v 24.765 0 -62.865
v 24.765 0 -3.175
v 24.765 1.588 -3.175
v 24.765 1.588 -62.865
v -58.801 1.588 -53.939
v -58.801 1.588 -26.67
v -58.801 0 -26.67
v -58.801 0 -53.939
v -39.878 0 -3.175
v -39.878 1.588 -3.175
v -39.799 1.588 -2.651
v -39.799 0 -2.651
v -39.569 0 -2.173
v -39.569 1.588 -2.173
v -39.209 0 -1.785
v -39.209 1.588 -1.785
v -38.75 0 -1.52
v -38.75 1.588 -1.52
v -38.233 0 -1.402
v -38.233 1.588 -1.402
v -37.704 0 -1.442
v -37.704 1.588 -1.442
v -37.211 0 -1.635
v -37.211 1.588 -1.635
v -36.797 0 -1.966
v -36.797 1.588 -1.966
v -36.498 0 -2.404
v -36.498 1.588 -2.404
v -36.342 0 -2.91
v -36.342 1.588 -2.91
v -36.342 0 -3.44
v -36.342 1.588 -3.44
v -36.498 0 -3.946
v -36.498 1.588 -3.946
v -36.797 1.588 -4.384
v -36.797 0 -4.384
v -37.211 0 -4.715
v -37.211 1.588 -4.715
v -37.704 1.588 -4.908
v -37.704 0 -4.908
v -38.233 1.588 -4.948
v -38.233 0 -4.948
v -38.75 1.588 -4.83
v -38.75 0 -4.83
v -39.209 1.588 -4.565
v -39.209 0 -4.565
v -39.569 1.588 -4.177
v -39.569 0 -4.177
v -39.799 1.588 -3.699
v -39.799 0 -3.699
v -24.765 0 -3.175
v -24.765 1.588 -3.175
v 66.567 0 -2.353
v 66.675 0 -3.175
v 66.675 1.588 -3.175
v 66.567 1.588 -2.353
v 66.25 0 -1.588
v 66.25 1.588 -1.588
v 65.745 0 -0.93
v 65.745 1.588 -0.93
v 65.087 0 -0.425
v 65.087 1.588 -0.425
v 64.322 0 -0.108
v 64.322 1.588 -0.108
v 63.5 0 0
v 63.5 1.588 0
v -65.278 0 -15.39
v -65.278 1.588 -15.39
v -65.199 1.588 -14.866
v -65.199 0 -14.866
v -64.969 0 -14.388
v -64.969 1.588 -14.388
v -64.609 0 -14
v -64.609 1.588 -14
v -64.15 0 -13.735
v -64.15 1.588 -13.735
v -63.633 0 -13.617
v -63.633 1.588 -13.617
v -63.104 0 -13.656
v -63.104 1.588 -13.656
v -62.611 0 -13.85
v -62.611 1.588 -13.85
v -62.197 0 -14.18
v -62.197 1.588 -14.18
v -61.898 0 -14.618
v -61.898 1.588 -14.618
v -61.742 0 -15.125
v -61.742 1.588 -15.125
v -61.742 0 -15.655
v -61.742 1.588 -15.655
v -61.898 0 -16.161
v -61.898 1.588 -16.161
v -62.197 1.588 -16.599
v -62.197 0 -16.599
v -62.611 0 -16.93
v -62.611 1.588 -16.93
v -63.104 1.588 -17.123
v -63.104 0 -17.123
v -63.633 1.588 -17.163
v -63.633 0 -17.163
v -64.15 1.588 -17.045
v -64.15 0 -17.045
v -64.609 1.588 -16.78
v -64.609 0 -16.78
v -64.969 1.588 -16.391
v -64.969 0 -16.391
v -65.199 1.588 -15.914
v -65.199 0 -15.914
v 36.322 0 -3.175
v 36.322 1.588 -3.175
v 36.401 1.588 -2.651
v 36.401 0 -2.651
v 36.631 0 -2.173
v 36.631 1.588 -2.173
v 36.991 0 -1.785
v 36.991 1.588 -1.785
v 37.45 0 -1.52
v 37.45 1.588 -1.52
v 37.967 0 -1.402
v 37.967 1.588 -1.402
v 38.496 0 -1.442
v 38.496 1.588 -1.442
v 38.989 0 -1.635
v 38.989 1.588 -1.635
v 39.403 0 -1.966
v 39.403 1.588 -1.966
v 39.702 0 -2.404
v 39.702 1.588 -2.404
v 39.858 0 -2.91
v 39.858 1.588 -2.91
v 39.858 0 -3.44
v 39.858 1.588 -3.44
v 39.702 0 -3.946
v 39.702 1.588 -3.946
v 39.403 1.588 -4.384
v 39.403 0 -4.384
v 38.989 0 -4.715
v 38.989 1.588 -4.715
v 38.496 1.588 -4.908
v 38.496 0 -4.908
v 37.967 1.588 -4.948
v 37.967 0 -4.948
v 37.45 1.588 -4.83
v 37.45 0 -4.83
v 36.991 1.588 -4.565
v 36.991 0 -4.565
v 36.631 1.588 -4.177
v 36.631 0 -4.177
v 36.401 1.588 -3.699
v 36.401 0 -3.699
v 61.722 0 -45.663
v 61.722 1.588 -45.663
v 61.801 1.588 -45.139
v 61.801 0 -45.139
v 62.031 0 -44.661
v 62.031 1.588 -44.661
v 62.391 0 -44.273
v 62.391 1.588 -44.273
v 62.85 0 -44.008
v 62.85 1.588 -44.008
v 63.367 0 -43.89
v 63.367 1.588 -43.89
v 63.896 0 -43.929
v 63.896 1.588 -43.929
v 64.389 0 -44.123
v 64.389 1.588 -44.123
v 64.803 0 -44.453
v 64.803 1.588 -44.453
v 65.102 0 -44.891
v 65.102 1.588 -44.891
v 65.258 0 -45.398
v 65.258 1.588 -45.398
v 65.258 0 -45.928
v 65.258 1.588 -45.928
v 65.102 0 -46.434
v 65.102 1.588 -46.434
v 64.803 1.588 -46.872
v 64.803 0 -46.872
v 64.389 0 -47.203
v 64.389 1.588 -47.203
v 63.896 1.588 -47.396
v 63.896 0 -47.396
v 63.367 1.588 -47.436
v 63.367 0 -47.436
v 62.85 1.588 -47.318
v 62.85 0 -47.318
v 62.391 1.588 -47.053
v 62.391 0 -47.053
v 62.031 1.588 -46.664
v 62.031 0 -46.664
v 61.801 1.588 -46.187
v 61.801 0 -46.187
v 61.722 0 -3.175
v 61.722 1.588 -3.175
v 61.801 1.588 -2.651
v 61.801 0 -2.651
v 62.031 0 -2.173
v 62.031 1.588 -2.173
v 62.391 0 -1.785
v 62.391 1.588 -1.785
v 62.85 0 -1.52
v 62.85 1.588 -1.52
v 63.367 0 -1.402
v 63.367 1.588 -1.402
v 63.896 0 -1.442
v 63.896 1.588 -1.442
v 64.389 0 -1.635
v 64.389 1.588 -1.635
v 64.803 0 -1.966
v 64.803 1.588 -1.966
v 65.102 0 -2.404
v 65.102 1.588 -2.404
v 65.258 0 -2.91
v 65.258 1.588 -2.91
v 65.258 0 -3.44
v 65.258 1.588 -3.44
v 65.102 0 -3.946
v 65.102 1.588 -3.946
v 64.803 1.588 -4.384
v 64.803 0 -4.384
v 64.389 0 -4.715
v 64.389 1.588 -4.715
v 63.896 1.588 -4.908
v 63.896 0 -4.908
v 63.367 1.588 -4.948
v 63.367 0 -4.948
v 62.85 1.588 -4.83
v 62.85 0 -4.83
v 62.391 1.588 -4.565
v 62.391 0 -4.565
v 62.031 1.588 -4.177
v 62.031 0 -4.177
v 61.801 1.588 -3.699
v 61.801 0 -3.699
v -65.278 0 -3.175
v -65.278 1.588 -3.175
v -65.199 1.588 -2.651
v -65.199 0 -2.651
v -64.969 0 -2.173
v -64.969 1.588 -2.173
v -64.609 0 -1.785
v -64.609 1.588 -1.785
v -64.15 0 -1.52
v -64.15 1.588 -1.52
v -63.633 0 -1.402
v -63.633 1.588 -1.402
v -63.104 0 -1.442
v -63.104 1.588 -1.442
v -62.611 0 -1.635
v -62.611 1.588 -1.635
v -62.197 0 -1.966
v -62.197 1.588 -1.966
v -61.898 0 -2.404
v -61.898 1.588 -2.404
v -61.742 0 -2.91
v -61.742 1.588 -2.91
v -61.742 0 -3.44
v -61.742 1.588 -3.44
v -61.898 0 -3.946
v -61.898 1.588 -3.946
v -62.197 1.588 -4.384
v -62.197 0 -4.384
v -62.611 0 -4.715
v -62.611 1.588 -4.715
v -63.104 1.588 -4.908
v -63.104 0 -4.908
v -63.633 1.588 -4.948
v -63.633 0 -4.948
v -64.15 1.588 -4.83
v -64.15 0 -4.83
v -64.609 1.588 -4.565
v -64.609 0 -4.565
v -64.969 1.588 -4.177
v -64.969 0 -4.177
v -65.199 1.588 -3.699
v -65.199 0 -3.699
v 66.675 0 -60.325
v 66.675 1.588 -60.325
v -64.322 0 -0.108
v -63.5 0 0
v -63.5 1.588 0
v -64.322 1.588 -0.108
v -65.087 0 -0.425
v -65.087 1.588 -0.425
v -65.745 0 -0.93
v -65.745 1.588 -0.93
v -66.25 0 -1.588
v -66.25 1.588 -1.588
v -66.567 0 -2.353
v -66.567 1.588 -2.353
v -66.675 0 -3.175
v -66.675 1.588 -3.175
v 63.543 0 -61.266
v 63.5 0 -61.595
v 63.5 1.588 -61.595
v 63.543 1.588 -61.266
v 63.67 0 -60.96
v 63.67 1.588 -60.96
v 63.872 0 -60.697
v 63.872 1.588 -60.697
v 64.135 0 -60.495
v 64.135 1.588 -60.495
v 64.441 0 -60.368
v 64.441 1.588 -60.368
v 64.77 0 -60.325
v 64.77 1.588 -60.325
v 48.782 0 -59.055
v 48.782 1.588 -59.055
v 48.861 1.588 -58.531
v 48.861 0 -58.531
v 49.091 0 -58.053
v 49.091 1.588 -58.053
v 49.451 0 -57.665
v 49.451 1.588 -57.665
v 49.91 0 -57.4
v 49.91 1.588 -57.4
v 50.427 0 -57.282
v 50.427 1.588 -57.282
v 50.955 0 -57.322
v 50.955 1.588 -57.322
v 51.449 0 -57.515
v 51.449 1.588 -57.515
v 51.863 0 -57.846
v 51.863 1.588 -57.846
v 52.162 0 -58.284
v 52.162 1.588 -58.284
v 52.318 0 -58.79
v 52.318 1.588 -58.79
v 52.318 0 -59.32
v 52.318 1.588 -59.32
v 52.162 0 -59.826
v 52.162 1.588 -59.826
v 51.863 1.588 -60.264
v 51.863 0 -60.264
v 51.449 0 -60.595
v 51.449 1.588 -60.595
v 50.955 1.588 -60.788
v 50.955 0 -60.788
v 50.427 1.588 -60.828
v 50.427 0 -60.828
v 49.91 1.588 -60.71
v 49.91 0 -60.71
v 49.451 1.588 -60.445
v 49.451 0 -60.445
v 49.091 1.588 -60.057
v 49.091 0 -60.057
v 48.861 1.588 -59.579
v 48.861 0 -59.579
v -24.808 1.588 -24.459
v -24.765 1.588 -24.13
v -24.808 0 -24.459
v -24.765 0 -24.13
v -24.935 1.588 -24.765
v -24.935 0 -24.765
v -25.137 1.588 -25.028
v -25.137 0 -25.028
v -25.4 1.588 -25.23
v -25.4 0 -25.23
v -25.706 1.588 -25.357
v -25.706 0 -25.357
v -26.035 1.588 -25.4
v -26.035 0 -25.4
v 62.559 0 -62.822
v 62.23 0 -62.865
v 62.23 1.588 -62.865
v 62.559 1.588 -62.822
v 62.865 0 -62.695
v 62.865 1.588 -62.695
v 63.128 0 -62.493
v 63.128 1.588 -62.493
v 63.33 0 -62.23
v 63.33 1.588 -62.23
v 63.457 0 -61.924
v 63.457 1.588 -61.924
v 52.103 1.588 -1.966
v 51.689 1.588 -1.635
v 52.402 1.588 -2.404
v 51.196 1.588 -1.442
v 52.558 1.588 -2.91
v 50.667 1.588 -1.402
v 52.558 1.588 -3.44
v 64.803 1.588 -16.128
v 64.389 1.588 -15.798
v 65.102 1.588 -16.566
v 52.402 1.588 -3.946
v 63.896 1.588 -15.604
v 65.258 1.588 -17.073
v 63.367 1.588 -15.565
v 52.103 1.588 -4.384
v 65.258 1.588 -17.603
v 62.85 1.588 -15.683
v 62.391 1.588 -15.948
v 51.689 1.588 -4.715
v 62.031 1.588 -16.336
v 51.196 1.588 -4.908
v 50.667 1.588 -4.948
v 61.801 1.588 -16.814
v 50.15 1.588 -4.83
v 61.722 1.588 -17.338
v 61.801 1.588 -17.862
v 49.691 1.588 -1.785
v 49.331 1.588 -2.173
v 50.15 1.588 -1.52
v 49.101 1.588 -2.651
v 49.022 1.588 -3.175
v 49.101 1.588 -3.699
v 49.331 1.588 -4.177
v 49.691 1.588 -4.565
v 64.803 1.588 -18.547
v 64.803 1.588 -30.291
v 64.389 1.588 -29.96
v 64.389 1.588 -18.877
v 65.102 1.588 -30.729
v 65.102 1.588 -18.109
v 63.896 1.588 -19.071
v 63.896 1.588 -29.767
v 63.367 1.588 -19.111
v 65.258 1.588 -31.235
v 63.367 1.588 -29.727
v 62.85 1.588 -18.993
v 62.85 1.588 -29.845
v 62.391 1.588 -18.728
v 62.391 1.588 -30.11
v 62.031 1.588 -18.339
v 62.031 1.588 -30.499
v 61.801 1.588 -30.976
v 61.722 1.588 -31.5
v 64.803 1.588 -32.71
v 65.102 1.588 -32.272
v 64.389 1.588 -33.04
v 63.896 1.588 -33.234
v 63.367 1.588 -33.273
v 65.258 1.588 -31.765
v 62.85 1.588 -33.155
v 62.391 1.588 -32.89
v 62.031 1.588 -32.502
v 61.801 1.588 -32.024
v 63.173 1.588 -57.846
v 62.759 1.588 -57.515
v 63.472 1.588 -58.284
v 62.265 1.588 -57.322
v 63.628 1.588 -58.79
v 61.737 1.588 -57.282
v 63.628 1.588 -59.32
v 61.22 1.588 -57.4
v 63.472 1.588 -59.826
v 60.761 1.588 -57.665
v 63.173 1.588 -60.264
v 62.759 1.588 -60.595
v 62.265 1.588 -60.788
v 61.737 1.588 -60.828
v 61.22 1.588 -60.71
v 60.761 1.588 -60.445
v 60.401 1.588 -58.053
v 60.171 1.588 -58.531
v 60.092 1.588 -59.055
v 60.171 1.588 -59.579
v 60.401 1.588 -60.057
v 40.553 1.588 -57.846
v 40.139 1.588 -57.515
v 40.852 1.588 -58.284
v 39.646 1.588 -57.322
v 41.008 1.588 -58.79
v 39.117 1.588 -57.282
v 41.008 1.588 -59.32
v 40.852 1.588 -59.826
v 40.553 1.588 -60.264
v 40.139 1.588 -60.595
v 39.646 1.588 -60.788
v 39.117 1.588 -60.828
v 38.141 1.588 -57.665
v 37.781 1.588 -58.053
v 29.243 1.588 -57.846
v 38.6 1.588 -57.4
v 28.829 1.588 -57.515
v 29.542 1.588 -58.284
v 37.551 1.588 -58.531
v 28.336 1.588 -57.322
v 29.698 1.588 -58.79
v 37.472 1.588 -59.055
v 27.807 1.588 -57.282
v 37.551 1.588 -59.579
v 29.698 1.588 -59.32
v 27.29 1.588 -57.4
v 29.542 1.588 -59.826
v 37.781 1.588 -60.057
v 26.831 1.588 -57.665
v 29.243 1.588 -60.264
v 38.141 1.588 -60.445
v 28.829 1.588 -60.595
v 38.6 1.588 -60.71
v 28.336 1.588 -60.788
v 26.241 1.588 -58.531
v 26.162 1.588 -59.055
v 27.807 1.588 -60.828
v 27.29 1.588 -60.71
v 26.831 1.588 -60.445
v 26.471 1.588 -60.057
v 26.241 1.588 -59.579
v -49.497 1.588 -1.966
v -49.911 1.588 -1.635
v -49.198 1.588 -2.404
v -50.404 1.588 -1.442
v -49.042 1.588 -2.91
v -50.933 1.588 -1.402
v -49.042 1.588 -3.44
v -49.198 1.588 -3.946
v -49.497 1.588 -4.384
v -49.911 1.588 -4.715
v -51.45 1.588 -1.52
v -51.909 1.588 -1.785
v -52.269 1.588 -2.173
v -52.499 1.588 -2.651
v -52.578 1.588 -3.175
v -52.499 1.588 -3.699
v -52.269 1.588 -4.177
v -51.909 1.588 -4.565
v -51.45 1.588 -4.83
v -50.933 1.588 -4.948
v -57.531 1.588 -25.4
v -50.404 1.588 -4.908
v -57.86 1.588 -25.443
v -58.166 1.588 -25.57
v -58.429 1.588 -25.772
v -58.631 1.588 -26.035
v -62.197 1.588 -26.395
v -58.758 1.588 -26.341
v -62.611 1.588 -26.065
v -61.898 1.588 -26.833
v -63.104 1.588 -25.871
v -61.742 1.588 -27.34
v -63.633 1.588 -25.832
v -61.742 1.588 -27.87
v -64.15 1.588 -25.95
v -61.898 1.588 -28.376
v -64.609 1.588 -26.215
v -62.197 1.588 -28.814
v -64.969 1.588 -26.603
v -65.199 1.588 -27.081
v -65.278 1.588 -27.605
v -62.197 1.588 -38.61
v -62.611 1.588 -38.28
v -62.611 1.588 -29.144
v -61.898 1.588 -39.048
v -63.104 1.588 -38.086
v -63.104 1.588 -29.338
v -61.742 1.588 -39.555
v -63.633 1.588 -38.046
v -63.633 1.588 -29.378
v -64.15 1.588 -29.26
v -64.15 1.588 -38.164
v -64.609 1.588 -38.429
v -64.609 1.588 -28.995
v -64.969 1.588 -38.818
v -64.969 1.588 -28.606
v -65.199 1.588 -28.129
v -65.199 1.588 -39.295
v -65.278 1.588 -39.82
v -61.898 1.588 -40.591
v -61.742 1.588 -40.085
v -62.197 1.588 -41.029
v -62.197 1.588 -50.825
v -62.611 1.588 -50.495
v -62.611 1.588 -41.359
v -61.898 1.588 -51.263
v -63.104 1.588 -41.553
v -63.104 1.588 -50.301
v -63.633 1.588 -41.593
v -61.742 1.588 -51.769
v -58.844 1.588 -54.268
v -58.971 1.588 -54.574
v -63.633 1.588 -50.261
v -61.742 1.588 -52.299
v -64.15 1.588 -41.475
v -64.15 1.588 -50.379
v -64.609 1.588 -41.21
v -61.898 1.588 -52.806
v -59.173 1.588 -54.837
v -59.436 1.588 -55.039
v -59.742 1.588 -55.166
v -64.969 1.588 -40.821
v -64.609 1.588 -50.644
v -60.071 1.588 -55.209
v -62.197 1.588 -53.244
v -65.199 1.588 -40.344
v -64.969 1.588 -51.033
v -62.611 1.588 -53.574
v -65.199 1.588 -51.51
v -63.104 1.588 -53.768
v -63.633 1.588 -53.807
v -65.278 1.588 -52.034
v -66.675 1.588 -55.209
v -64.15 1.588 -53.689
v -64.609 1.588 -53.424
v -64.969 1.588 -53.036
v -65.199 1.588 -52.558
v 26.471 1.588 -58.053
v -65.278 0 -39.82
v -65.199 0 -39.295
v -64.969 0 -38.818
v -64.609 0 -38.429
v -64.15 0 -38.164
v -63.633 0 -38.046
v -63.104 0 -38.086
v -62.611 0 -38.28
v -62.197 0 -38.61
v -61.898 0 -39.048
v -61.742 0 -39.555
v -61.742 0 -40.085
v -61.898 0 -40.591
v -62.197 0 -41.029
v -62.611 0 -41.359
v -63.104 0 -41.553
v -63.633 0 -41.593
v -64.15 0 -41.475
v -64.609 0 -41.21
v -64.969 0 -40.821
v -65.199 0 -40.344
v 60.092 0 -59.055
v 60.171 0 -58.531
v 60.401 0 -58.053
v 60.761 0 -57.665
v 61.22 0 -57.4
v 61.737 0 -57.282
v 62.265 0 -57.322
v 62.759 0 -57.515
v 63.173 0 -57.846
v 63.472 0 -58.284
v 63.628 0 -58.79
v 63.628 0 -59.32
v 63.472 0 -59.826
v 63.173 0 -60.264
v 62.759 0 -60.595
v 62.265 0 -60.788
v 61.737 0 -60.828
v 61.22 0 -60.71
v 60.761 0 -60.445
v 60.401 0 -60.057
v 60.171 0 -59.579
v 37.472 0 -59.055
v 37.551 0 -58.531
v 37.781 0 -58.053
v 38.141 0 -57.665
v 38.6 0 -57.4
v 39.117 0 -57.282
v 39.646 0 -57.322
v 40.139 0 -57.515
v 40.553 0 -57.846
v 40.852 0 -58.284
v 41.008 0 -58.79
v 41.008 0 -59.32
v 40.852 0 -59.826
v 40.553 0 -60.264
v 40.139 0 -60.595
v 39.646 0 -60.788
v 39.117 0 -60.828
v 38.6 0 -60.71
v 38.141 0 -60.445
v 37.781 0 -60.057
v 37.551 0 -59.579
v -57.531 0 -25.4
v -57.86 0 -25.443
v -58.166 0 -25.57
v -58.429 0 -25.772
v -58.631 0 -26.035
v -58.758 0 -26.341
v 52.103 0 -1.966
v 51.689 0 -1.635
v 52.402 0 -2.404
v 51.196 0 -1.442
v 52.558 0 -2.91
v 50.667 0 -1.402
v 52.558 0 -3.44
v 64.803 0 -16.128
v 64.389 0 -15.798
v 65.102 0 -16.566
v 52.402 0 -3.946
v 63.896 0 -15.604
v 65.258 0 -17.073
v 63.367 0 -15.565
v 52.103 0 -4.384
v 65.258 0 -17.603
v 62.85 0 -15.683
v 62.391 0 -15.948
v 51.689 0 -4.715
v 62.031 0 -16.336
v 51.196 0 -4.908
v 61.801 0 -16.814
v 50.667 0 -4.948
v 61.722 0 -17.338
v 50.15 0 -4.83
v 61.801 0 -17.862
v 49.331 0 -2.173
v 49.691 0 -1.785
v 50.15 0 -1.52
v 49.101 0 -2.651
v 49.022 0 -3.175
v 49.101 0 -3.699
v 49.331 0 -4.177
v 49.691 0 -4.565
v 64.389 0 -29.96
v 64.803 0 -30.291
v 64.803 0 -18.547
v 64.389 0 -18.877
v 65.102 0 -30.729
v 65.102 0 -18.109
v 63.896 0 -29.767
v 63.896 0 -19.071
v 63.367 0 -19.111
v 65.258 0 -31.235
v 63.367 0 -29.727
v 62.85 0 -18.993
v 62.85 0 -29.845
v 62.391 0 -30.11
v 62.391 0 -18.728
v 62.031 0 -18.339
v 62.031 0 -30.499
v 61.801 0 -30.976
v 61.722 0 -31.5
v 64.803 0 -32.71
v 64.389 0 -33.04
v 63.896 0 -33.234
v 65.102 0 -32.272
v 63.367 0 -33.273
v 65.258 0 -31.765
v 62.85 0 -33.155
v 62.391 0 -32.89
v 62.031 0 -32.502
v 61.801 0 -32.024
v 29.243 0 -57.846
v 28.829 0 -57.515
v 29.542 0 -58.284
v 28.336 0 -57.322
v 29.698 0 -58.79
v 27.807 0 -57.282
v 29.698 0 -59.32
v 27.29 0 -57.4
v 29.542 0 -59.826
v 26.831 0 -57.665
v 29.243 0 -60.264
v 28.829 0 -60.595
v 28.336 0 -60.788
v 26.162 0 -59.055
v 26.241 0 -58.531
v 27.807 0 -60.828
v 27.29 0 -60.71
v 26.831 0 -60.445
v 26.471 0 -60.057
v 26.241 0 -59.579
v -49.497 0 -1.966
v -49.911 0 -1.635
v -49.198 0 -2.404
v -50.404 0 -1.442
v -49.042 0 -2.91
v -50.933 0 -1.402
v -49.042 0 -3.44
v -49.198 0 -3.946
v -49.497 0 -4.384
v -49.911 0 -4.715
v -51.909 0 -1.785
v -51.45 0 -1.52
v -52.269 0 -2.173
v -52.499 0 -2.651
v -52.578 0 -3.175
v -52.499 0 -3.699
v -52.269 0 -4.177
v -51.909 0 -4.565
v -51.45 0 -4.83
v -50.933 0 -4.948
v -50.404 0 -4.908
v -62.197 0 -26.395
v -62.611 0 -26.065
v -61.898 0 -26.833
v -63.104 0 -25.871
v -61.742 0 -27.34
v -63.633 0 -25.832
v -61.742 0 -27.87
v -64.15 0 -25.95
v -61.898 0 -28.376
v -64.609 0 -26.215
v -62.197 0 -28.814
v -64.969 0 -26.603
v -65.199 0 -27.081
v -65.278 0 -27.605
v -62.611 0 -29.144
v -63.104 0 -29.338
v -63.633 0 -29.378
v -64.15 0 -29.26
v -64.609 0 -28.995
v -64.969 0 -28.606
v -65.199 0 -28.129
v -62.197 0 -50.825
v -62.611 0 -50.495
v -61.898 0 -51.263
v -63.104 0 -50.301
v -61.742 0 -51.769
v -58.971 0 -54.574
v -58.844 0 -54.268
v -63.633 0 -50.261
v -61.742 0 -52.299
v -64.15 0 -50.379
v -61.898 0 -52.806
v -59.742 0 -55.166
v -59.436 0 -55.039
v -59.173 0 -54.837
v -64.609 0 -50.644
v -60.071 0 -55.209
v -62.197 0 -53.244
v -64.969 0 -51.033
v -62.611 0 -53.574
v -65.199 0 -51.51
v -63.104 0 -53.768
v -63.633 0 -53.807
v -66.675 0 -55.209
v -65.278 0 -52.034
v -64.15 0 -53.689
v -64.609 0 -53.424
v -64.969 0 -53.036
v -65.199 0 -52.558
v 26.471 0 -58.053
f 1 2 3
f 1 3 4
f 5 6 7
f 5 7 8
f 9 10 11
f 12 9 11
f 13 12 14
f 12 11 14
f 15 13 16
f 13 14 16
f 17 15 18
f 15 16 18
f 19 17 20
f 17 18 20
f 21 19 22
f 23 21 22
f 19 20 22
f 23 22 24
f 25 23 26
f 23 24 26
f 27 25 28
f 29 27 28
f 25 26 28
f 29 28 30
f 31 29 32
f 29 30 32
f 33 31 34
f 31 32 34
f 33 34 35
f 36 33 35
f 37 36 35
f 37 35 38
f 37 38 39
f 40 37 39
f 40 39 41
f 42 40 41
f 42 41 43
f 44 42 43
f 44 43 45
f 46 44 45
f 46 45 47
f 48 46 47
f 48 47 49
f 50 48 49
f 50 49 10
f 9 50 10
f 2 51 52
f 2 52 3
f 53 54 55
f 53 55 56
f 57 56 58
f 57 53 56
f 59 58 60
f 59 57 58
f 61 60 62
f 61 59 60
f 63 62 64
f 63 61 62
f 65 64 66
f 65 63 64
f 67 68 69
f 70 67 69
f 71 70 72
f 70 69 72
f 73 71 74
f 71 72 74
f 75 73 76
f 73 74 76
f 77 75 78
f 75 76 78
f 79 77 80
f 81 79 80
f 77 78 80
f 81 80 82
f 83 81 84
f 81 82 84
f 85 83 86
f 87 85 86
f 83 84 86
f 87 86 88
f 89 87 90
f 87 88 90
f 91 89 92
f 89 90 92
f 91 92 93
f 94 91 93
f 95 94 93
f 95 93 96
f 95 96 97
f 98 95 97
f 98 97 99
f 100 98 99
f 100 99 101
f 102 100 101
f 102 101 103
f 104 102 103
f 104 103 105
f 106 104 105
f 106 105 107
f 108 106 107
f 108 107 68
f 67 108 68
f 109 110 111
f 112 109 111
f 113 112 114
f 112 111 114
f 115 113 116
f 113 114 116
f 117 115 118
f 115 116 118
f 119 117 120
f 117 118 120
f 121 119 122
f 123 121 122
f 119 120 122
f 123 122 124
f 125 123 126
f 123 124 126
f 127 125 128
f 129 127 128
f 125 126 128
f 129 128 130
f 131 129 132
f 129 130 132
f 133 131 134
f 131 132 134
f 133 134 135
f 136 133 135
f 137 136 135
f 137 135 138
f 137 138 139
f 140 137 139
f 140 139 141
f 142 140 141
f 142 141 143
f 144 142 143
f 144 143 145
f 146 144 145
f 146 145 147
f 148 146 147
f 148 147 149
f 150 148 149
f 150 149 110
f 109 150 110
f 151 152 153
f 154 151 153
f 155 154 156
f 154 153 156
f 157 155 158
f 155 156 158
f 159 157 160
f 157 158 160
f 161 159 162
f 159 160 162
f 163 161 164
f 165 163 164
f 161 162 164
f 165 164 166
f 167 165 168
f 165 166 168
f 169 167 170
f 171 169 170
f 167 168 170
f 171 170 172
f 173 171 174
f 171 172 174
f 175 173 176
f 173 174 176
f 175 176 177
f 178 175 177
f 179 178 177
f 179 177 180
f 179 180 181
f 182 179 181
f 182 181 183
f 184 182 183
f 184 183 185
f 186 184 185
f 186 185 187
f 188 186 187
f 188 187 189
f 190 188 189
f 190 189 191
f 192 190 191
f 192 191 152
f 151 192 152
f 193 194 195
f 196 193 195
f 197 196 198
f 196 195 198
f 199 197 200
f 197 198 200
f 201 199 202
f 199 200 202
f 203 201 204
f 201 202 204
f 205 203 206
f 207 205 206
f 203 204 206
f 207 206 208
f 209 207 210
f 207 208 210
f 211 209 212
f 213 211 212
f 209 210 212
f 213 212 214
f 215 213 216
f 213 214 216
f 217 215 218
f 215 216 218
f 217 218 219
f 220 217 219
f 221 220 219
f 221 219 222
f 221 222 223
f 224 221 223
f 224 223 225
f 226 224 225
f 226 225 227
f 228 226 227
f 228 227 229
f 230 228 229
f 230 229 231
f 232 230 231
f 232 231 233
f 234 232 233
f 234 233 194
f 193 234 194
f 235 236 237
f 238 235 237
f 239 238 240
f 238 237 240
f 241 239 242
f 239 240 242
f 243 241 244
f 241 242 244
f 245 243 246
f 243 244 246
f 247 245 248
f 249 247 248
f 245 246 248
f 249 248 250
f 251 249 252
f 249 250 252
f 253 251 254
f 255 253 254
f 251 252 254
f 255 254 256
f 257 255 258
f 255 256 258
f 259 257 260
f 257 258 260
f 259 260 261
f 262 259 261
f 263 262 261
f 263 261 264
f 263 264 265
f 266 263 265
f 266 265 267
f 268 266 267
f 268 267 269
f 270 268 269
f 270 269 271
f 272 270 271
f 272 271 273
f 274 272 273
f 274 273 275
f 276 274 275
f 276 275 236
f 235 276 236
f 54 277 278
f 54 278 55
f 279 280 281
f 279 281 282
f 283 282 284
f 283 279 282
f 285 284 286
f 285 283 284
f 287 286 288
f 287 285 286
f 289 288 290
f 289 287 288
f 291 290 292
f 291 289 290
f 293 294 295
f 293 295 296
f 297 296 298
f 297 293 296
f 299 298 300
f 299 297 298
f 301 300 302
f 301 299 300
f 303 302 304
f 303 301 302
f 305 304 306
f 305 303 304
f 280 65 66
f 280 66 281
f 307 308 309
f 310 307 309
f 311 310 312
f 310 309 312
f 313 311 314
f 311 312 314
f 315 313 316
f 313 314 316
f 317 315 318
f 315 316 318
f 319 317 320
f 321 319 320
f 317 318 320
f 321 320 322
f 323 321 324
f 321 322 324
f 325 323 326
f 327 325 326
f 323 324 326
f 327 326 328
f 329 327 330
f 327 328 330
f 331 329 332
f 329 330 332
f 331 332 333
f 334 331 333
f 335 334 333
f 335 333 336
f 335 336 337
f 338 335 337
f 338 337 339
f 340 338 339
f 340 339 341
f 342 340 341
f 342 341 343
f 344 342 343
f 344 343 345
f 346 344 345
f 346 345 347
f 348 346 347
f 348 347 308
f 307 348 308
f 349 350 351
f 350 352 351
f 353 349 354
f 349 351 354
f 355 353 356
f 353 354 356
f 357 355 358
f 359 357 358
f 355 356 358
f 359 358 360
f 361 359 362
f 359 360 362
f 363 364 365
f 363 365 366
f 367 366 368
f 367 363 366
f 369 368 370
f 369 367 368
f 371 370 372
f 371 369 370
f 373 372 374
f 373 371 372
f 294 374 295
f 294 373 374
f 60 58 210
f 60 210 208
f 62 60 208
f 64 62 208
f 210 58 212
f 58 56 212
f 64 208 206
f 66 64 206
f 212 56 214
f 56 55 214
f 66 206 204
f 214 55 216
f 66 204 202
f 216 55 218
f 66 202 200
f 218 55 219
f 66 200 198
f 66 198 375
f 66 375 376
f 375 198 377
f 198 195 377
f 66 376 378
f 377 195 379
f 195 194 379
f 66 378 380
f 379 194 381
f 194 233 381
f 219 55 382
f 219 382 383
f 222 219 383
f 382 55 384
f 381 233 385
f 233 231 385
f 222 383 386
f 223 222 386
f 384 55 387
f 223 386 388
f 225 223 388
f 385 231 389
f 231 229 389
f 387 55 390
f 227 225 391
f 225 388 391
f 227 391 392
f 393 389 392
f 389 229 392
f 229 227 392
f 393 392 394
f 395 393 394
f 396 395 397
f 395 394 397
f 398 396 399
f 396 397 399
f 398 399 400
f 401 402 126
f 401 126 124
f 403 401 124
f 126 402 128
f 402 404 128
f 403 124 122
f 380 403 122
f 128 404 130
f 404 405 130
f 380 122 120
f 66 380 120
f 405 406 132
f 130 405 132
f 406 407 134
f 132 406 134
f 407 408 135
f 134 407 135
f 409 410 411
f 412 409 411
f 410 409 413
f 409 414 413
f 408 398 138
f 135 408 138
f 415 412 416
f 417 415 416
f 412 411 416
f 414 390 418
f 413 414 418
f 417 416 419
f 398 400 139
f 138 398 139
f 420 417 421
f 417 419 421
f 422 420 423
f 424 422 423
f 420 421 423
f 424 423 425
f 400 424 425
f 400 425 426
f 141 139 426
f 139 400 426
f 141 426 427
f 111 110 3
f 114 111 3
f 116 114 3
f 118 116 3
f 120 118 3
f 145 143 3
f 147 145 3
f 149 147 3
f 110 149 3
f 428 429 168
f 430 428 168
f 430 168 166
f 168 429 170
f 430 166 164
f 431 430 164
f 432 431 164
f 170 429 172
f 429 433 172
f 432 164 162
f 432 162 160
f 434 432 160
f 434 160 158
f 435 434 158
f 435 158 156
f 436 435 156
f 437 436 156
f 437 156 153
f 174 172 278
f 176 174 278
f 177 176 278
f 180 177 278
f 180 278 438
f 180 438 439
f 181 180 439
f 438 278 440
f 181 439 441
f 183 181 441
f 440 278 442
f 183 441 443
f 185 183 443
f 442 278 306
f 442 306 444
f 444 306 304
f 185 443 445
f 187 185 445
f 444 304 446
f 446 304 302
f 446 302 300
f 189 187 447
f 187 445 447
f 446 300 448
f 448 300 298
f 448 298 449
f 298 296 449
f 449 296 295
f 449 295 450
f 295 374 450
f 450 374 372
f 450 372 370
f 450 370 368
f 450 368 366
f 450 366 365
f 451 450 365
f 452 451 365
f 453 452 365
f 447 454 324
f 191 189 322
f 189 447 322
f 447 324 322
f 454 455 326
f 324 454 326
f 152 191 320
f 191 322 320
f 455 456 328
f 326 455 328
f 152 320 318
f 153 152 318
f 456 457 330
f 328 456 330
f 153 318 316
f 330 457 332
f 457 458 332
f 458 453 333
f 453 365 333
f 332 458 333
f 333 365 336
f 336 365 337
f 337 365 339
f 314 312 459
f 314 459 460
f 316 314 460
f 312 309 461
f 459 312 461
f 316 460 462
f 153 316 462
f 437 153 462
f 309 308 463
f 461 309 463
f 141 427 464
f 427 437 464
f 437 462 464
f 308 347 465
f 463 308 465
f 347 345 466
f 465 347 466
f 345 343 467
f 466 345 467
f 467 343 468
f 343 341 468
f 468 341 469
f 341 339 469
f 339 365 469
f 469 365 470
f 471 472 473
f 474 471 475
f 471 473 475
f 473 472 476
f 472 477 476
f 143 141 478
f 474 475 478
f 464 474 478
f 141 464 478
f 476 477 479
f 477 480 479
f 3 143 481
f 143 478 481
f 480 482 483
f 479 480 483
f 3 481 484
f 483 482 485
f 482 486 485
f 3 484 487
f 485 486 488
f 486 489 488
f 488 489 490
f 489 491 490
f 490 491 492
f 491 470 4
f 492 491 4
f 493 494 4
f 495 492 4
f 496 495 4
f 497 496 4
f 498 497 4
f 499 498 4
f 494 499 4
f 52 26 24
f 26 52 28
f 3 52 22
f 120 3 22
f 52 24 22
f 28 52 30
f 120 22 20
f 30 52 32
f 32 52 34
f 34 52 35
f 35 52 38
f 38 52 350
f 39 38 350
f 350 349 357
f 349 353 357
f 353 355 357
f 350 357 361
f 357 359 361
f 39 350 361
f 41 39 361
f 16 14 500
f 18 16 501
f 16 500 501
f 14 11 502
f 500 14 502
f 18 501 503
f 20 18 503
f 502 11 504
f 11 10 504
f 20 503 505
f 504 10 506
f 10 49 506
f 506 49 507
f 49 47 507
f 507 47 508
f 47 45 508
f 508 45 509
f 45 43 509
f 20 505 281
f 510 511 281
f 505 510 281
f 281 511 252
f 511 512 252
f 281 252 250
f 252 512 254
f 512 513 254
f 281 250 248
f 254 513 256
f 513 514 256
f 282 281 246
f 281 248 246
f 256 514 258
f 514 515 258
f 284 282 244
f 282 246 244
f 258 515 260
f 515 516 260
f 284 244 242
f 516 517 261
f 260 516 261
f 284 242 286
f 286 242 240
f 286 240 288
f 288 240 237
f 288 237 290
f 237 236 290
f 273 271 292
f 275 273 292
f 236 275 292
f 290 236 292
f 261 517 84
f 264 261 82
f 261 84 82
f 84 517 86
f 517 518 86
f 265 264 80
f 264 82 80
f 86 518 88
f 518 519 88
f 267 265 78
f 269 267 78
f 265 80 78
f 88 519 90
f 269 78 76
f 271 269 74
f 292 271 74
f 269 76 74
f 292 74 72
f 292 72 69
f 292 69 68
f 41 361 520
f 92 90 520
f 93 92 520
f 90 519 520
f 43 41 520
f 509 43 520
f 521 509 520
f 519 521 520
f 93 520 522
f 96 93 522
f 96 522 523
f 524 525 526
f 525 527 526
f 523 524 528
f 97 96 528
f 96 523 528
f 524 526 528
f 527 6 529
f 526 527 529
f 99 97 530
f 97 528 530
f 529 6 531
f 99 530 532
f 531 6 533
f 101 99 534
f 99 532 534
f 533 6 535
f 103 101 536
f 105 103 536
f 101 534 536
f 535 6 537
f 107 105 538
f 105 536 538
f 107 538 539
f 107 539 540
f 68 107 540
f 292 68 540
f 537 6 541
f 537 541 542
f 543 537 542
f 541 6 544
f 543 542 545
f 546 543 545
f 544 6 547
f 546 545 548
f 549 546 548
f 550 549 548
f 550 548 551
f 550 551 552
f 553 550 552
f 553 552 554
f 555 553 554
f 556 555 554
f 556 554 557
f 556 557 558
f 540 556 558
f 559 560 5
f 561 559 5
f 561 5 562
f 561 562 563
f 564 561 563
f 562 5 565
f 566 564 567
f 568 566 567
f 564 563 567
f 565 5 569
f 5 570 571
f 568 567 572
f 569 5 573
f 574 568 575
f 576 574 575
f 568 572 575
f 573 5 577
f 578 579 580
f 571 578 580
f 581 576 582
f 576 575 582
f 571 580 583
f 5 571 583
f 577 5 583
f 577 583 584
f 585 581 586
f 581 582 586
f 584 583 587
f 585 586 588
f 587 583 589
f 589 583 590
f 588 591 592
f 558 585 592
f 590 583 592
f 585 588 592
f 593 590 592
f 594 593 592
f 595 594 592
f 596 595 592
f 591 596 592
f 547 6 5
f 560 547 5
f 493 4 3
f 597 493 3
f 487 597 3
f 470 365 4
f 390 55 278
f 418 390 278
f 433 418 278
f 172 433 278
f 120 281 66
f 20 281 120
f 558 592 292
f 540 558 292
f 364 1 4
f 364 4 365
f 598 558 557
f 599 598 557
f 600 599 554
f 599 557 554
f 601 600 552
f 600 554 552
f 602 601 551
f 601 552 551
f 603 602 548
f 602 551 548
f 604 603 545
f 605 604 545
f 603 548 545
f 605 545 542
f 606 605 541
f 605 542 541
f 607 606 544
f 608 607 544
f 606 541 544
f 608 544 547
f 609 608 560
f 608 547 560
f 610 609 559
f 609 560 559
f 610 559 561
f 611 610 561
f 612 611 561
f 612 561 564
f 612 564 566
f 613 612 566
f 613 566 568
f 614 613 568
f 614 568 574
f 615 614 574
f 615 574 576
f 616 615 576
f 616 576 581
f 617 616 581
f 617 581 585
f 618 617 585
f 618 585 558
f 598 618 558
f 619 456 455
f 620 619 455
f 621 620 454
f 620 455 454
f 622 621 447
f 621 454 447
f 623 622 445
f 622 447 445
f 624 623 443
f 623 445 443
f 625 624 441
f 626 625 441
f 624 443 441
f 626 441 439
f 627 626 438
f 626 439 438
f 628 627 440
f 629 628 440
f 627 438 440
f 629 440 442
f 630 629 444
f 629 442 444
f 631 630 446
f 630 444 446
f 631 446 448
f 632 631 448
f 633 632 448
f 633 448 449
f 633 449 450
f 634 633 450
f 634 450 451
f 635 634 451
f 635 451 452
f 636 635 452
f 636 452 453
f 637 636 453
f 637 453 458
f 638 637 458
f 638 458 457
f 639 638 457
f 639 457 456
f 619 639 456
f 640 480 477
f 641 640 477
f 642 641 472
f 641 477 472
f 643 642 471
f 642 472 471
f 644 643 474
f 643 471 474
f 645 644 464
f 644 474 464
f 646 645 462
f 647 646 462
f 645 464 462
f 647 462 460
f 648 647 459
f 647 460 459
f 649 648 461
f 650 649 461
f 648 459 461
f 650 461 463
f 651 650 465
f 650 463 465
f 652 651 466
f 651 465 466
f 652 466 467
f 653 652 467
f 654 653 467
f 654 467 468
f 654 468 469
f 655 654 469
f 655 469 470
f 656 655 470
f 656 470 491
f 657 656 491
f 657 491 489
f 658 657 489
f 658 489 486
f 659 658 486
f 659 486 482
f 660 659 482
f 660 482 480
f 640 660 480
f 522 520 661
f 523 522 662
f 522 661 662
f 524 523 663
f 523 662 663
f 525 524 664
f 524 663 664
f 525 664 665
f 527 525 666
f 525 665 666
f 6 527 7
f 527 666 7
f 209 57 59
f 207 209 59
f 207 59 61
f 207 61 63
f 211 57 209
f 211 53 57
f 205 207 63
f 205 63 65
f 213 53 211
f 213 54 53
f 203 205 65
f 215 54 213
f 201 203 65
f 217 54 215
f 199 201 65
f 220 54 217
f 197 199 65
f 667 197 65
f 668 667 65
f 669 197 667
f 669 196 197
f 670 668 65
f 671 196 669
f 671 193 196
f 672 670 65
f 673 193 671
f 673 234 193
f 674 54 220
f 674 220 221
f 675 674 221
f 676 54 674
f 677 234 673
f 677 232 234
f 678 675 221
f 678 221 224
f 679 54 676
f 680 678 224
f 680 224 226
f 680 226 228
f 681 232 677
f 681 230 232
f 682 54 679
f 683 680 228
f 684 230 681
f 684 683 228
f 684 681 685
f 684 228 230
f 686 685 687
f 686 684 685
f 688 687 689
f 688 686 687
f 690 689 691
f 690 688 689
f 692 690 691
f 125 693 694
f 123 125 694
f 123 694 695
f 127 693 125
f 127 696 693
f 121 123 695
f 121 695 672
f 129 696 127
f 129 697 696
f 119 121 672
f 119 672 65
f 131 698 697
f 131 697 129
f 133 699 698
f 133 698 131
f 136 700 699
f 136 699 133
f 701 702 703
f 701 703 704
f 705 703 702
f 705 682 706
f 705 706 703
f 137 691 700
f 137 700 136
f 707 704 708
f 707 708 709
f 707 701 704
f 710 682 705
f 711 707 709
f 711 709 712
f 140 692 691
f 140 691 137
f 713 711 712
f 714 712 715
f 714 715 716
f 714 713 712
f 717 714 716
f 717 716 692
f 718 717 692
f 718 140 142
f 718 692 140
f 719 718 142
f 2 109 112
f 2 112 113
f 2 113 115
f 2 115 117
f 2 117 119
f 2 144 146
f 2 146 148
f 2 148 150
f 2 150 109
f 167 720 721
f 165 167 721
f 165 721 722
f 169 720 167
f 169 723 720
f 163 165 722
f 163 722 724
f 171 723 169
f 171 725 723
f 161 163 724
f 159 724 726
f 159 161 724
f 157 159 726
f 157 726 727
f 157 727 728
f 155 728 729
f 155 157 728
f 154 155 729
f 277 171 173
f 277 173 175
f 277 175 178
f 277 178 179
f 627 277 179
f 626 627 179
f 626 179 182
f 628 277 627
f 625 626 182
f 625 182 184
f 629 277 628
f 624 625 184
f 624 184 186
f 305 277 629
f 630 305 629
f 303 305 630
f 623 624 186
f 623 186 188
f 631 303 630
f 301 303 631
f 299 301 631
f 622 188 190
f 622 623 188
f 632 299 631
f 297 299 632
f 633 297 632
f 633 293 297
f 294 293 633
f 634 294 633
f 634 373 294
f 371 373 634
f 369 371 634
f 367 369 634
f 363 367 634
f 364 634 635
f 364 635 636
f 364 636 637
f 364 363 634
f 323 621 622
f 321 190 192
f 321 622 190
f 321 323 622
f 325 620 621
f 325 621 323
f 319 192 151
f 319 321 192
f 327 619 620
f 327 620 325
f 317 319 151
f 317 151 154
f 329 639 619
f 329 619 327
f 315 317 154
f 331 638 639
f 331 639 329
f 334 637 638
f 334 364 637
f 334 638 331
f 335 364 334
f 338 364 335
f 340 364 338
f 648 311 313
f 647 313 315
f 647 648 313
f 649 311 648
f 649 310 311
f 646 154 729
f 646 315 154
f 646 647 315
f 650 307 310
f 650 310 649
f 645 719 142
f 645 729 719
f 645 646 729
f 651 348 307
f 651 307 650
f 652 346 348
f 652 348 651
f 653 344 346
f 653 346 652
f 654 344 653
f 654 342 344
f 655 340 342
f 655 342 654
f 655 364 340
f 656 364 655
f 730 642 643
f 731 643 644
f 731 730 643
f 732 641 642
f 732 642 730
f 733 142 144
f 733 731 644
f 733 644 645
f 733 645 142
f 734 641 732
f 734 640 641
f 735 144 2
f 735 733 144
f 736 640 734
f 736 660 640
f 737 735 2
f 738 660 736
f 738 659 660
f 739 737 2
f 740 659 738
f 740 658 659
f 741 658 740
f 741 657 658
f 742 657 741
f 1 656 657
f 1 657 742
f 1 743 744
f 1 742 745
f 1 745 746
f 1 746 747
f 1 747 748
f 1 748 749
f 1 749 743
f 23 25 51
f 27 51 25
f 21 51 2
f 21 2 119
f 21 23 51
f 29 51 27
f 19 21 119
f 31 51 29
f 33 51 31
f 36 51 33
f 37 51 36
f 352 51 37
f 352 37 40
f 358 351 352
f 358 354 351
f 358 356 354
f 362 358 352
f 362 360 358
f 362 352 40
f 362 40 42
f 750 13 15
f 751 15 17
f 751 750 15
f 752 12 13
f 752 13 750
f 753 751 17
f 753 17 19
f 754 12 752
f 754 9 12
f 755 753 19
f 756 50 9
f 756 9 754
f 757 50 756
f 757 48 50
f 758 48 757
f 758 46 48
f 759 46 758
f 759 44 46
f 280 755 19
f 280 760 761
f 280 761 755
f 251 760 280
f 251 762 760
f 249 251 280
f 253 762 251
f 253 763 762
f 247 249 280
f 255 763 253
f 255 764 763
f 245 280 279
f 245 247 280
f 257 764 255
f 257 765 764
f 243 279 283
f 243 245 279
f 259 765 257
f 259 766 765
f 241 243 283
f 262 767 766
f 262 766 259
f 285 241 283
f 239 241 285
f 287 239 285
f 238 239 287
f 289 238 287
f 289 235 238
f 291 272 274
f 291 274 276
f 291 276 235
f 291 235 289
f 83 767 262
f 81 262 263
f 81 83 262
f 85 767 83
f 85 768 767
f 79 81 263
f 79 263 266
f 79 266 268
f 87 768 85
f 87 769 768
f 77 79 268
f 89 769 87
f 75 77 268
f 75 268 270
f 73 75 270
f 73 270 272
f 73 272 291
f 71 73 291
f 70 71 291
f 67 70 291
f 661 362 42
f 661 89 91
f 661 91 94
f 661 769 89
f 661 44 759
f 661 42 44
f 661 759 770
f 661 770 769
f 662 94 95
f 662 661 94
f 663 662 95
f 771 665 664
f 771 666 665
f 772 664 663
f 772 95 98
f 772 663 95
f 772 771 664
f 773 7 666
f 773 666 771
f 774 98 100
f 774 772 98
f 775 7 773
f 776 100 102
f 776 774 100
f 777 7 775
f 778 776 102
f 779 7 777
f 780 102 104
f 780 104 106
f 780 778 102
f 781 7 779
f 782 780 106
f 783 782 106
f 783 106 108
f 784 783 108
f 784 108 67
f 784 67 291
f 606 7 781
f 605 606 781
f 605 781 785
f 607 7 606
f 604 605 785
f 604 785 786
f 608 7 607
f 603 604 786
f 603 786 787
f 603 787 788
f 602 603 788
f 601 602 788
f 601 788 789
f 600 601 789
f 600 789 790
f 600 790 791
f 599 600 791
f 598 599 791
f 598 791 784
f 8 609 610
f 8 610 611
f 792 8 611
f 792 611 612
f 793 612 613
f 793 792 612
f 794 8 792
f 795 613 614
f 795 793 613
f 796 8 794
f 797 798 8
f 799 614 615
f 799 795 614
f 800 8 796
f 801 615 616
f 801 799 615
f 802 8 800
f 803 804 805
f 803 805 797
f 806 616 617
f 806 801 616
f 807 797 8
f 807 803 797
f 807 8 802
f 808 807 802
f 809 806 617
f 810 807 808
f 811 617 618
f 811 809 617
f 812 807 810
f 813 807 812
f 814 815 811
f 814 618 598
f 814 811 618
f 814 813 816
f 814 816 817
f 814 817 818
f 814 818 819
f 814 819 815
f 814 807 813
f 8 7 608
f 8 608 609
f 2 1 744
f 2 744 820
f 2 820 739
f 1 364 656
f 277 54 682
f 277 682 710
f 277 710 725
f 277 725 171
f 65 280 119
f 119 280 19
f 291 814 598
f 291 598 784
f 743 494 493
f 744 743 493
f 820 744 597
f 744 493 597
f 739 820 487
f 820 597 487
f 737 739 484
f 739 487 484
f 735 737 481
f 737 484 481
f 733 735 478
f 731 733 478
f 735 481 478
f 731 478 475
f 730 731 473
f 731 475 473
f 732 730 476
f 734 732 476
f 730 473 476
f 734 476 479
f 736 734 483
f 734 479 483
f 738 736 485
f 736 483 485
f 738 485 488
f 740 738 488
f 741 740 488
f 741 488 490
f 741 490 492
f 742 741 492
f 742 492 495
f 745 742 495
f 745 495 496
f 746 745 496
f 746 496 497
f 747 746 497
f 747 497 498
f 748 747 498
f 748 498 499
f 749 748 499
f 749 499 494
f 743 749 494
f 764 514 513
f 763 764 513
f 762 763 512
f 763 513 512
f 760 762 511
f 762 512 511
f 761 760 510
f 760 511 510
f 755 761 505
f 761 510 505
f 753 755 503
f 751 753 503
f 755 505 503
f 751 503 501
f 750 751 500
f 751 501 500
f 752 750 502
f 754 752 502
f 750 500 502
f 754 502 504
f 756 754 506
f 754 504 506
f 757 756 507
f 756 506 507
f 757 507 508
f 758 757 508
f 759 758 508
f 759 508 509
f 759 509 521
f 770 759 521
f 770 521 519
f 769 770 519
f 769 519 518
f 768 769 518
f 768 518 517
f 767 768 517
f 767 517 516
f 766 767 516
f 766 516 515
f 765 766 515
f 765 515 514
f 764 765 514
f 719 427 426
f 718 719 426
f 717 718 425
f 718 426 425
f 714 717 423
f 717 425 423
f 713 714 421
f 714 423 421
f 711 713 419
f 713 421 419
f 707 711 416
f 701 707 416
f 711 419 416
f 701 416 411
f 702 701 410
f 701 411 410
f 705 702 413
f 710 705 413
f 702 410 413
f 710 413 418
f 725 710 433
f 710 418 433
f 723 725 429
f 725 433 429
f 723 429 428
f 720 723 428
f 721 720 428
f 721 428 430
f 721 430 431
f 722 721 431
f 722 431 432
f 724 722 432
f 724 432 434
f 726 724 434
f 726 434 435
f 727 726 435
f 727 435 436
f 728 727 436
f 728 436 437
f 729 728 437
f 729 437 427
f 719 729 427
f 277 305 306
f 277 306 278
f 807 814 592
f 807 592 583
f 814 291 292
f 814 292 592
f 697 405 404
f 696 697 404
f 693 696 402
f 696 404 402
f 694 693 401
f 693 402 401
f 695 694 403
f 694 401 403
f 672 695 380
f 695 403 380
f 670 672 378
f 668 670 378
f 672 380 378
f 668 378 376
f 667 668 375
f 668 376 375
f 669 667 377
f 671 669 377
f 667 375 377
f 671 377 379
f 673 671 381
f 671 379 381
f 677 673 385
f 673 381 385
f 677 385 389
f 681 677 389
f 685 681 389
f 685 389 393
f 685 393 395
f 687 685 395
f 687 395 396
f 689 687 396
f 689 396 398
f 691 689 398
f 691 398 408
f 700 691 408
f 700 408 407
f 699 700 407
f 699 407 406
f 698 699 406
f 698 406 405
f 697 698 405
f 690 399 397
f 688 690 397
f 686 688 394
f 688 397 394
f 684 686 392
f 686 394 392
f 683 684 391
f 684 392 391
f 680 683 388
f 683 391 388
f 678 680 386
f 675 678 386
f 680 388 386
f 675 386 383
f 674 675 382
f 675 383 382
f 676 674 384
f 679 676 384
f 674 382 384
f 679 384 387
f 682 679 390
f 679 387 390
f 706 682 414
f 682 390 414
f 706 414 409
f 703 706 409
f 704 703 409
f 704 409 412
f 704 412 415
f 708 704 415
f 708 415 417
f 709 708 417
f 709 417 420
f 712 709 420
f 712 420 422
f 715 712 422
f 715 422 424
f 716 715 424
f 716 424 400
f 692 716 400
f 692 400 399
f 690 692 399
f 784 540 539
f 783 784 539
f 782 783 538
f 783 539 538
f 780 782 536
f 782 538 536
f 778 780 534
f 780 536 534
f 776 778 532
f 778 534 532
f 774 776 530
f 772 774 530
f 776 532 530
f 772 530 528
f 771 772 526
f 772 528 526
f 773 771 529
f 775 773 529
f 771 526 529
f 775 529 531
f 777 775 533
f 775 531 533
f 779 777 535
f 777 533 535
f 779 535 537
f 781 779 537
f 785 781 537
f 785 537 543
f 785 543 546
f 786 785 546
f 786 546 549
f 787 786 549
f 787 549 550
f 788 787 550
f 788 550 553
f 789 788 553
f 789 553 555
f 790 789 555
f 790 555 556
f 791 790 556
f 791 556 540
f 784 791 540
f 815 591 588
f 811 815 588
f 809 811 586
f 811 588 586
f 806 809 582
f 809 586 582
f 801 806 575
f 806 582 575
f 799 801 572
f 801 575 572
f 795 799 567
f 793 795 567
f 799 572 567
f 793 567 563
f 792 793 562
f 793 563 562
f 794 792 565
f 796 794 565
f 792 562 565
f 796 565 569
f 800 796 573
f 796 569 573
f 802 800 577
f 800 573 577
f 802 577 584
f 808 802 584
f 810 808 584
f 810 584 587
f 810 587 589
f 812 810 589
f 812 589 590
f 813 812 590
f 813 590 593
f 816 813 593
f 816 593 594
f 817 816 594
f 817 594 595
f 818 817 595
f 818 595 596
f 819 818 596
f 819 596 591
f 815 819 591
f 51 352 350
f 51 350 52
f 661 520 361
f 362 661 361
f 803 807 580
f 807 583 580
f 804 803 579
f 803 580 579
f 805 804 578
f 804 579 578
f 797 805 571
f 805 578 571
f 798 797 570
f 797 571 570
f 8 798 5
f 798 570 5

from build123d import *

# Parameters (mm, degrees)
BOSS_EXTRUDE1_DEPTH     = 1.5875
SKETCH2_R               = 1.778
CUT_EXTRUDE1_DEPTH      = 1
CUT_EXTRUDE1_DEPTH_BACK = 2.5875
FILLET1_R               = 1.27
SKETCH3_W               = 34.036
SKETCH3_H               = 12.7
CUT_EXTRUDE2_DEPTH      = 1
CUT_EXTRUDE2_DEPTH_BACK = 2.5875
FILLET2_R               = 1.27


with BuildPart() as part:
    # Sketch1 → Boss-Extrude1 (new body)
    with BuildSketch(Plane(origin=(0, 0, 0), x_dir=(1, 0, 0), z_dir=(0, 1, 0))):
        with BuildLine():
            Line((-66.675, 3.175), (-66.675, 55.209357386))
            Line((-66.675, 55.209357386), (-58.801, 55.209357386))
            Line((-58.801, 55.209357386), (-58.801, 36.83))
            Line((-58.801, 36.83), (-24.765, 36.83))
            Line((-24.765, 36.83), (-24.765, 3.175))
            Line((-24.765, 3.175), (24.765, 3.175))
            Line((24.765, 3.175), (24.765, 62.865))
            Line((24.765, 62.865), (62.23, 62.865))
            ThreePointArc((62.23, 62.865), (63.128025612, 62.493025612), (63.5, 61.595))
            ThreePointArc((63.5, 61.595), (63.871974388, 60.696974388), (64.77, 60.325))
            Line((64.77, 60.325), (66.675, 60.325))
            Line((66.675, 60.325), (66.675, 3.175))
            ThreePointArc((66.675, 3.175), (65.74506403, 0.92993597), (63.5, 0))
            Line((63.5, 0), (-63.5, 0))
            ThreePointArc((-63.5, 0), (-65.74506403, 0.92993597), (-66.675, 3.175))
        make_face()
    extrude(amount=BOSS_EXTRUDE1_DEPTH)

    # Sketch2 → Cut-Extrude1 (cut, two sides)
    with BuildSketch(Plane(origin=(0, 1.5875, 0), x_dir=(-1, 0, 0), z_dir=(0, 1, 0))) as cut_extrude1_sk:
        with Locations((63.5, -3.175)):
            Circle(SKETCH2_R)
        with Locations((50.8, -3.175)):
            Circle(SKETCH2_R)
        with Locations((38.1, -3.175)):
            Circle(SKETCH2_R)
        with Locations((-38.1, -3.175)):
            Circle(SKETCH2_R)
        with Locations((-50.8, -3.175)):
            Circle(SKETCH2_R)
        with Locations((-63.5, -3.175)):
            Circle(SKETCH2_R)
        with Locations((63.5, -15.389839347)):
            Circle(SKETCH2_R)
        with Locations((63.5, -27.604678693)):
            Circle(SKETCH2_R)
        with Locations((63.5, -39.81951804)):
            Circle(SKETCH2_R)
        with Locations((63.5, -52.034357386)):
            Circle(SKETCH2_R)
        with Locations((-63.5, -17.337603912)):
            Circle(SKETCH2_R)
        with Locations((-63.5, -31.500207823)):
            Circle(SKETCH2_R)
        with Locations((-63.5, -45.662811735)):
            Circle(SKETCH2_R)
        with Locations((-61.869746345, -59.055)):
            Circle(SKETCH2_R)
        with Locations((-50.559830897, -59.055)):
            Circle(SKETCH2_R)
        with Locations((-39.249915448, -59.055)):
            Circle(SKETCH2_R)
        with Locations((-27.94, -59.055)):
            Circle(SKETCH2_R)
    extrude(amount=CUT_EXTRUDE1_DEPTH, mode=Mode.SUBTRACT)
    extrude(cut_extrude1_sk.sketch, amount=-CUT_EXTRUDE1_DEPTH_BACK, mode=Mode.SUBTRACT)

    # Fillet1
    fillet1_edges = [part.edges().sort_by_distance(p)[0] for p in [
        (-58.801, 0.79375, -55.209357386),
        (-58.801, 0.79375, -36.83),
        (-24.765, 0.79375, -36.83),
    ]]
    fillet(fillet1_edges, radius=FILLET1_R)

    # Sketch3 → Cut-Extrude2 (cut, two sides)
    with BuildSketch(Plane(origin=(0, 1.5875, 0), x_dir=(1, 0, 0), z_dir=(0, 1, 0))) as cut_extrude2_sk:
        with Locations((-41.783, 31.75)):
            Rectangle(SKETCH3_W, SKETCH3_H)
    extrude(amount=CUT_EXTRUDE2_DEPTH, mode=Mode.SUBTRACT)
    extrude(cut_extrude2_sk.sketch, amount=-CUT_EXTRUDE2_DEPTH_BACK, mode=Mode.SUBTRACT)

    # Fillet2
    fillet2_edges = [part.edges().sort_by_distance(p)[0] for p in [
        (-24.765, 0.79375, -25.4),
        (-58.801, 0.79375, -25.4),
    ]]
    fillet(fillet2_edges, radius=FILLET2_R)


solid = part.part
